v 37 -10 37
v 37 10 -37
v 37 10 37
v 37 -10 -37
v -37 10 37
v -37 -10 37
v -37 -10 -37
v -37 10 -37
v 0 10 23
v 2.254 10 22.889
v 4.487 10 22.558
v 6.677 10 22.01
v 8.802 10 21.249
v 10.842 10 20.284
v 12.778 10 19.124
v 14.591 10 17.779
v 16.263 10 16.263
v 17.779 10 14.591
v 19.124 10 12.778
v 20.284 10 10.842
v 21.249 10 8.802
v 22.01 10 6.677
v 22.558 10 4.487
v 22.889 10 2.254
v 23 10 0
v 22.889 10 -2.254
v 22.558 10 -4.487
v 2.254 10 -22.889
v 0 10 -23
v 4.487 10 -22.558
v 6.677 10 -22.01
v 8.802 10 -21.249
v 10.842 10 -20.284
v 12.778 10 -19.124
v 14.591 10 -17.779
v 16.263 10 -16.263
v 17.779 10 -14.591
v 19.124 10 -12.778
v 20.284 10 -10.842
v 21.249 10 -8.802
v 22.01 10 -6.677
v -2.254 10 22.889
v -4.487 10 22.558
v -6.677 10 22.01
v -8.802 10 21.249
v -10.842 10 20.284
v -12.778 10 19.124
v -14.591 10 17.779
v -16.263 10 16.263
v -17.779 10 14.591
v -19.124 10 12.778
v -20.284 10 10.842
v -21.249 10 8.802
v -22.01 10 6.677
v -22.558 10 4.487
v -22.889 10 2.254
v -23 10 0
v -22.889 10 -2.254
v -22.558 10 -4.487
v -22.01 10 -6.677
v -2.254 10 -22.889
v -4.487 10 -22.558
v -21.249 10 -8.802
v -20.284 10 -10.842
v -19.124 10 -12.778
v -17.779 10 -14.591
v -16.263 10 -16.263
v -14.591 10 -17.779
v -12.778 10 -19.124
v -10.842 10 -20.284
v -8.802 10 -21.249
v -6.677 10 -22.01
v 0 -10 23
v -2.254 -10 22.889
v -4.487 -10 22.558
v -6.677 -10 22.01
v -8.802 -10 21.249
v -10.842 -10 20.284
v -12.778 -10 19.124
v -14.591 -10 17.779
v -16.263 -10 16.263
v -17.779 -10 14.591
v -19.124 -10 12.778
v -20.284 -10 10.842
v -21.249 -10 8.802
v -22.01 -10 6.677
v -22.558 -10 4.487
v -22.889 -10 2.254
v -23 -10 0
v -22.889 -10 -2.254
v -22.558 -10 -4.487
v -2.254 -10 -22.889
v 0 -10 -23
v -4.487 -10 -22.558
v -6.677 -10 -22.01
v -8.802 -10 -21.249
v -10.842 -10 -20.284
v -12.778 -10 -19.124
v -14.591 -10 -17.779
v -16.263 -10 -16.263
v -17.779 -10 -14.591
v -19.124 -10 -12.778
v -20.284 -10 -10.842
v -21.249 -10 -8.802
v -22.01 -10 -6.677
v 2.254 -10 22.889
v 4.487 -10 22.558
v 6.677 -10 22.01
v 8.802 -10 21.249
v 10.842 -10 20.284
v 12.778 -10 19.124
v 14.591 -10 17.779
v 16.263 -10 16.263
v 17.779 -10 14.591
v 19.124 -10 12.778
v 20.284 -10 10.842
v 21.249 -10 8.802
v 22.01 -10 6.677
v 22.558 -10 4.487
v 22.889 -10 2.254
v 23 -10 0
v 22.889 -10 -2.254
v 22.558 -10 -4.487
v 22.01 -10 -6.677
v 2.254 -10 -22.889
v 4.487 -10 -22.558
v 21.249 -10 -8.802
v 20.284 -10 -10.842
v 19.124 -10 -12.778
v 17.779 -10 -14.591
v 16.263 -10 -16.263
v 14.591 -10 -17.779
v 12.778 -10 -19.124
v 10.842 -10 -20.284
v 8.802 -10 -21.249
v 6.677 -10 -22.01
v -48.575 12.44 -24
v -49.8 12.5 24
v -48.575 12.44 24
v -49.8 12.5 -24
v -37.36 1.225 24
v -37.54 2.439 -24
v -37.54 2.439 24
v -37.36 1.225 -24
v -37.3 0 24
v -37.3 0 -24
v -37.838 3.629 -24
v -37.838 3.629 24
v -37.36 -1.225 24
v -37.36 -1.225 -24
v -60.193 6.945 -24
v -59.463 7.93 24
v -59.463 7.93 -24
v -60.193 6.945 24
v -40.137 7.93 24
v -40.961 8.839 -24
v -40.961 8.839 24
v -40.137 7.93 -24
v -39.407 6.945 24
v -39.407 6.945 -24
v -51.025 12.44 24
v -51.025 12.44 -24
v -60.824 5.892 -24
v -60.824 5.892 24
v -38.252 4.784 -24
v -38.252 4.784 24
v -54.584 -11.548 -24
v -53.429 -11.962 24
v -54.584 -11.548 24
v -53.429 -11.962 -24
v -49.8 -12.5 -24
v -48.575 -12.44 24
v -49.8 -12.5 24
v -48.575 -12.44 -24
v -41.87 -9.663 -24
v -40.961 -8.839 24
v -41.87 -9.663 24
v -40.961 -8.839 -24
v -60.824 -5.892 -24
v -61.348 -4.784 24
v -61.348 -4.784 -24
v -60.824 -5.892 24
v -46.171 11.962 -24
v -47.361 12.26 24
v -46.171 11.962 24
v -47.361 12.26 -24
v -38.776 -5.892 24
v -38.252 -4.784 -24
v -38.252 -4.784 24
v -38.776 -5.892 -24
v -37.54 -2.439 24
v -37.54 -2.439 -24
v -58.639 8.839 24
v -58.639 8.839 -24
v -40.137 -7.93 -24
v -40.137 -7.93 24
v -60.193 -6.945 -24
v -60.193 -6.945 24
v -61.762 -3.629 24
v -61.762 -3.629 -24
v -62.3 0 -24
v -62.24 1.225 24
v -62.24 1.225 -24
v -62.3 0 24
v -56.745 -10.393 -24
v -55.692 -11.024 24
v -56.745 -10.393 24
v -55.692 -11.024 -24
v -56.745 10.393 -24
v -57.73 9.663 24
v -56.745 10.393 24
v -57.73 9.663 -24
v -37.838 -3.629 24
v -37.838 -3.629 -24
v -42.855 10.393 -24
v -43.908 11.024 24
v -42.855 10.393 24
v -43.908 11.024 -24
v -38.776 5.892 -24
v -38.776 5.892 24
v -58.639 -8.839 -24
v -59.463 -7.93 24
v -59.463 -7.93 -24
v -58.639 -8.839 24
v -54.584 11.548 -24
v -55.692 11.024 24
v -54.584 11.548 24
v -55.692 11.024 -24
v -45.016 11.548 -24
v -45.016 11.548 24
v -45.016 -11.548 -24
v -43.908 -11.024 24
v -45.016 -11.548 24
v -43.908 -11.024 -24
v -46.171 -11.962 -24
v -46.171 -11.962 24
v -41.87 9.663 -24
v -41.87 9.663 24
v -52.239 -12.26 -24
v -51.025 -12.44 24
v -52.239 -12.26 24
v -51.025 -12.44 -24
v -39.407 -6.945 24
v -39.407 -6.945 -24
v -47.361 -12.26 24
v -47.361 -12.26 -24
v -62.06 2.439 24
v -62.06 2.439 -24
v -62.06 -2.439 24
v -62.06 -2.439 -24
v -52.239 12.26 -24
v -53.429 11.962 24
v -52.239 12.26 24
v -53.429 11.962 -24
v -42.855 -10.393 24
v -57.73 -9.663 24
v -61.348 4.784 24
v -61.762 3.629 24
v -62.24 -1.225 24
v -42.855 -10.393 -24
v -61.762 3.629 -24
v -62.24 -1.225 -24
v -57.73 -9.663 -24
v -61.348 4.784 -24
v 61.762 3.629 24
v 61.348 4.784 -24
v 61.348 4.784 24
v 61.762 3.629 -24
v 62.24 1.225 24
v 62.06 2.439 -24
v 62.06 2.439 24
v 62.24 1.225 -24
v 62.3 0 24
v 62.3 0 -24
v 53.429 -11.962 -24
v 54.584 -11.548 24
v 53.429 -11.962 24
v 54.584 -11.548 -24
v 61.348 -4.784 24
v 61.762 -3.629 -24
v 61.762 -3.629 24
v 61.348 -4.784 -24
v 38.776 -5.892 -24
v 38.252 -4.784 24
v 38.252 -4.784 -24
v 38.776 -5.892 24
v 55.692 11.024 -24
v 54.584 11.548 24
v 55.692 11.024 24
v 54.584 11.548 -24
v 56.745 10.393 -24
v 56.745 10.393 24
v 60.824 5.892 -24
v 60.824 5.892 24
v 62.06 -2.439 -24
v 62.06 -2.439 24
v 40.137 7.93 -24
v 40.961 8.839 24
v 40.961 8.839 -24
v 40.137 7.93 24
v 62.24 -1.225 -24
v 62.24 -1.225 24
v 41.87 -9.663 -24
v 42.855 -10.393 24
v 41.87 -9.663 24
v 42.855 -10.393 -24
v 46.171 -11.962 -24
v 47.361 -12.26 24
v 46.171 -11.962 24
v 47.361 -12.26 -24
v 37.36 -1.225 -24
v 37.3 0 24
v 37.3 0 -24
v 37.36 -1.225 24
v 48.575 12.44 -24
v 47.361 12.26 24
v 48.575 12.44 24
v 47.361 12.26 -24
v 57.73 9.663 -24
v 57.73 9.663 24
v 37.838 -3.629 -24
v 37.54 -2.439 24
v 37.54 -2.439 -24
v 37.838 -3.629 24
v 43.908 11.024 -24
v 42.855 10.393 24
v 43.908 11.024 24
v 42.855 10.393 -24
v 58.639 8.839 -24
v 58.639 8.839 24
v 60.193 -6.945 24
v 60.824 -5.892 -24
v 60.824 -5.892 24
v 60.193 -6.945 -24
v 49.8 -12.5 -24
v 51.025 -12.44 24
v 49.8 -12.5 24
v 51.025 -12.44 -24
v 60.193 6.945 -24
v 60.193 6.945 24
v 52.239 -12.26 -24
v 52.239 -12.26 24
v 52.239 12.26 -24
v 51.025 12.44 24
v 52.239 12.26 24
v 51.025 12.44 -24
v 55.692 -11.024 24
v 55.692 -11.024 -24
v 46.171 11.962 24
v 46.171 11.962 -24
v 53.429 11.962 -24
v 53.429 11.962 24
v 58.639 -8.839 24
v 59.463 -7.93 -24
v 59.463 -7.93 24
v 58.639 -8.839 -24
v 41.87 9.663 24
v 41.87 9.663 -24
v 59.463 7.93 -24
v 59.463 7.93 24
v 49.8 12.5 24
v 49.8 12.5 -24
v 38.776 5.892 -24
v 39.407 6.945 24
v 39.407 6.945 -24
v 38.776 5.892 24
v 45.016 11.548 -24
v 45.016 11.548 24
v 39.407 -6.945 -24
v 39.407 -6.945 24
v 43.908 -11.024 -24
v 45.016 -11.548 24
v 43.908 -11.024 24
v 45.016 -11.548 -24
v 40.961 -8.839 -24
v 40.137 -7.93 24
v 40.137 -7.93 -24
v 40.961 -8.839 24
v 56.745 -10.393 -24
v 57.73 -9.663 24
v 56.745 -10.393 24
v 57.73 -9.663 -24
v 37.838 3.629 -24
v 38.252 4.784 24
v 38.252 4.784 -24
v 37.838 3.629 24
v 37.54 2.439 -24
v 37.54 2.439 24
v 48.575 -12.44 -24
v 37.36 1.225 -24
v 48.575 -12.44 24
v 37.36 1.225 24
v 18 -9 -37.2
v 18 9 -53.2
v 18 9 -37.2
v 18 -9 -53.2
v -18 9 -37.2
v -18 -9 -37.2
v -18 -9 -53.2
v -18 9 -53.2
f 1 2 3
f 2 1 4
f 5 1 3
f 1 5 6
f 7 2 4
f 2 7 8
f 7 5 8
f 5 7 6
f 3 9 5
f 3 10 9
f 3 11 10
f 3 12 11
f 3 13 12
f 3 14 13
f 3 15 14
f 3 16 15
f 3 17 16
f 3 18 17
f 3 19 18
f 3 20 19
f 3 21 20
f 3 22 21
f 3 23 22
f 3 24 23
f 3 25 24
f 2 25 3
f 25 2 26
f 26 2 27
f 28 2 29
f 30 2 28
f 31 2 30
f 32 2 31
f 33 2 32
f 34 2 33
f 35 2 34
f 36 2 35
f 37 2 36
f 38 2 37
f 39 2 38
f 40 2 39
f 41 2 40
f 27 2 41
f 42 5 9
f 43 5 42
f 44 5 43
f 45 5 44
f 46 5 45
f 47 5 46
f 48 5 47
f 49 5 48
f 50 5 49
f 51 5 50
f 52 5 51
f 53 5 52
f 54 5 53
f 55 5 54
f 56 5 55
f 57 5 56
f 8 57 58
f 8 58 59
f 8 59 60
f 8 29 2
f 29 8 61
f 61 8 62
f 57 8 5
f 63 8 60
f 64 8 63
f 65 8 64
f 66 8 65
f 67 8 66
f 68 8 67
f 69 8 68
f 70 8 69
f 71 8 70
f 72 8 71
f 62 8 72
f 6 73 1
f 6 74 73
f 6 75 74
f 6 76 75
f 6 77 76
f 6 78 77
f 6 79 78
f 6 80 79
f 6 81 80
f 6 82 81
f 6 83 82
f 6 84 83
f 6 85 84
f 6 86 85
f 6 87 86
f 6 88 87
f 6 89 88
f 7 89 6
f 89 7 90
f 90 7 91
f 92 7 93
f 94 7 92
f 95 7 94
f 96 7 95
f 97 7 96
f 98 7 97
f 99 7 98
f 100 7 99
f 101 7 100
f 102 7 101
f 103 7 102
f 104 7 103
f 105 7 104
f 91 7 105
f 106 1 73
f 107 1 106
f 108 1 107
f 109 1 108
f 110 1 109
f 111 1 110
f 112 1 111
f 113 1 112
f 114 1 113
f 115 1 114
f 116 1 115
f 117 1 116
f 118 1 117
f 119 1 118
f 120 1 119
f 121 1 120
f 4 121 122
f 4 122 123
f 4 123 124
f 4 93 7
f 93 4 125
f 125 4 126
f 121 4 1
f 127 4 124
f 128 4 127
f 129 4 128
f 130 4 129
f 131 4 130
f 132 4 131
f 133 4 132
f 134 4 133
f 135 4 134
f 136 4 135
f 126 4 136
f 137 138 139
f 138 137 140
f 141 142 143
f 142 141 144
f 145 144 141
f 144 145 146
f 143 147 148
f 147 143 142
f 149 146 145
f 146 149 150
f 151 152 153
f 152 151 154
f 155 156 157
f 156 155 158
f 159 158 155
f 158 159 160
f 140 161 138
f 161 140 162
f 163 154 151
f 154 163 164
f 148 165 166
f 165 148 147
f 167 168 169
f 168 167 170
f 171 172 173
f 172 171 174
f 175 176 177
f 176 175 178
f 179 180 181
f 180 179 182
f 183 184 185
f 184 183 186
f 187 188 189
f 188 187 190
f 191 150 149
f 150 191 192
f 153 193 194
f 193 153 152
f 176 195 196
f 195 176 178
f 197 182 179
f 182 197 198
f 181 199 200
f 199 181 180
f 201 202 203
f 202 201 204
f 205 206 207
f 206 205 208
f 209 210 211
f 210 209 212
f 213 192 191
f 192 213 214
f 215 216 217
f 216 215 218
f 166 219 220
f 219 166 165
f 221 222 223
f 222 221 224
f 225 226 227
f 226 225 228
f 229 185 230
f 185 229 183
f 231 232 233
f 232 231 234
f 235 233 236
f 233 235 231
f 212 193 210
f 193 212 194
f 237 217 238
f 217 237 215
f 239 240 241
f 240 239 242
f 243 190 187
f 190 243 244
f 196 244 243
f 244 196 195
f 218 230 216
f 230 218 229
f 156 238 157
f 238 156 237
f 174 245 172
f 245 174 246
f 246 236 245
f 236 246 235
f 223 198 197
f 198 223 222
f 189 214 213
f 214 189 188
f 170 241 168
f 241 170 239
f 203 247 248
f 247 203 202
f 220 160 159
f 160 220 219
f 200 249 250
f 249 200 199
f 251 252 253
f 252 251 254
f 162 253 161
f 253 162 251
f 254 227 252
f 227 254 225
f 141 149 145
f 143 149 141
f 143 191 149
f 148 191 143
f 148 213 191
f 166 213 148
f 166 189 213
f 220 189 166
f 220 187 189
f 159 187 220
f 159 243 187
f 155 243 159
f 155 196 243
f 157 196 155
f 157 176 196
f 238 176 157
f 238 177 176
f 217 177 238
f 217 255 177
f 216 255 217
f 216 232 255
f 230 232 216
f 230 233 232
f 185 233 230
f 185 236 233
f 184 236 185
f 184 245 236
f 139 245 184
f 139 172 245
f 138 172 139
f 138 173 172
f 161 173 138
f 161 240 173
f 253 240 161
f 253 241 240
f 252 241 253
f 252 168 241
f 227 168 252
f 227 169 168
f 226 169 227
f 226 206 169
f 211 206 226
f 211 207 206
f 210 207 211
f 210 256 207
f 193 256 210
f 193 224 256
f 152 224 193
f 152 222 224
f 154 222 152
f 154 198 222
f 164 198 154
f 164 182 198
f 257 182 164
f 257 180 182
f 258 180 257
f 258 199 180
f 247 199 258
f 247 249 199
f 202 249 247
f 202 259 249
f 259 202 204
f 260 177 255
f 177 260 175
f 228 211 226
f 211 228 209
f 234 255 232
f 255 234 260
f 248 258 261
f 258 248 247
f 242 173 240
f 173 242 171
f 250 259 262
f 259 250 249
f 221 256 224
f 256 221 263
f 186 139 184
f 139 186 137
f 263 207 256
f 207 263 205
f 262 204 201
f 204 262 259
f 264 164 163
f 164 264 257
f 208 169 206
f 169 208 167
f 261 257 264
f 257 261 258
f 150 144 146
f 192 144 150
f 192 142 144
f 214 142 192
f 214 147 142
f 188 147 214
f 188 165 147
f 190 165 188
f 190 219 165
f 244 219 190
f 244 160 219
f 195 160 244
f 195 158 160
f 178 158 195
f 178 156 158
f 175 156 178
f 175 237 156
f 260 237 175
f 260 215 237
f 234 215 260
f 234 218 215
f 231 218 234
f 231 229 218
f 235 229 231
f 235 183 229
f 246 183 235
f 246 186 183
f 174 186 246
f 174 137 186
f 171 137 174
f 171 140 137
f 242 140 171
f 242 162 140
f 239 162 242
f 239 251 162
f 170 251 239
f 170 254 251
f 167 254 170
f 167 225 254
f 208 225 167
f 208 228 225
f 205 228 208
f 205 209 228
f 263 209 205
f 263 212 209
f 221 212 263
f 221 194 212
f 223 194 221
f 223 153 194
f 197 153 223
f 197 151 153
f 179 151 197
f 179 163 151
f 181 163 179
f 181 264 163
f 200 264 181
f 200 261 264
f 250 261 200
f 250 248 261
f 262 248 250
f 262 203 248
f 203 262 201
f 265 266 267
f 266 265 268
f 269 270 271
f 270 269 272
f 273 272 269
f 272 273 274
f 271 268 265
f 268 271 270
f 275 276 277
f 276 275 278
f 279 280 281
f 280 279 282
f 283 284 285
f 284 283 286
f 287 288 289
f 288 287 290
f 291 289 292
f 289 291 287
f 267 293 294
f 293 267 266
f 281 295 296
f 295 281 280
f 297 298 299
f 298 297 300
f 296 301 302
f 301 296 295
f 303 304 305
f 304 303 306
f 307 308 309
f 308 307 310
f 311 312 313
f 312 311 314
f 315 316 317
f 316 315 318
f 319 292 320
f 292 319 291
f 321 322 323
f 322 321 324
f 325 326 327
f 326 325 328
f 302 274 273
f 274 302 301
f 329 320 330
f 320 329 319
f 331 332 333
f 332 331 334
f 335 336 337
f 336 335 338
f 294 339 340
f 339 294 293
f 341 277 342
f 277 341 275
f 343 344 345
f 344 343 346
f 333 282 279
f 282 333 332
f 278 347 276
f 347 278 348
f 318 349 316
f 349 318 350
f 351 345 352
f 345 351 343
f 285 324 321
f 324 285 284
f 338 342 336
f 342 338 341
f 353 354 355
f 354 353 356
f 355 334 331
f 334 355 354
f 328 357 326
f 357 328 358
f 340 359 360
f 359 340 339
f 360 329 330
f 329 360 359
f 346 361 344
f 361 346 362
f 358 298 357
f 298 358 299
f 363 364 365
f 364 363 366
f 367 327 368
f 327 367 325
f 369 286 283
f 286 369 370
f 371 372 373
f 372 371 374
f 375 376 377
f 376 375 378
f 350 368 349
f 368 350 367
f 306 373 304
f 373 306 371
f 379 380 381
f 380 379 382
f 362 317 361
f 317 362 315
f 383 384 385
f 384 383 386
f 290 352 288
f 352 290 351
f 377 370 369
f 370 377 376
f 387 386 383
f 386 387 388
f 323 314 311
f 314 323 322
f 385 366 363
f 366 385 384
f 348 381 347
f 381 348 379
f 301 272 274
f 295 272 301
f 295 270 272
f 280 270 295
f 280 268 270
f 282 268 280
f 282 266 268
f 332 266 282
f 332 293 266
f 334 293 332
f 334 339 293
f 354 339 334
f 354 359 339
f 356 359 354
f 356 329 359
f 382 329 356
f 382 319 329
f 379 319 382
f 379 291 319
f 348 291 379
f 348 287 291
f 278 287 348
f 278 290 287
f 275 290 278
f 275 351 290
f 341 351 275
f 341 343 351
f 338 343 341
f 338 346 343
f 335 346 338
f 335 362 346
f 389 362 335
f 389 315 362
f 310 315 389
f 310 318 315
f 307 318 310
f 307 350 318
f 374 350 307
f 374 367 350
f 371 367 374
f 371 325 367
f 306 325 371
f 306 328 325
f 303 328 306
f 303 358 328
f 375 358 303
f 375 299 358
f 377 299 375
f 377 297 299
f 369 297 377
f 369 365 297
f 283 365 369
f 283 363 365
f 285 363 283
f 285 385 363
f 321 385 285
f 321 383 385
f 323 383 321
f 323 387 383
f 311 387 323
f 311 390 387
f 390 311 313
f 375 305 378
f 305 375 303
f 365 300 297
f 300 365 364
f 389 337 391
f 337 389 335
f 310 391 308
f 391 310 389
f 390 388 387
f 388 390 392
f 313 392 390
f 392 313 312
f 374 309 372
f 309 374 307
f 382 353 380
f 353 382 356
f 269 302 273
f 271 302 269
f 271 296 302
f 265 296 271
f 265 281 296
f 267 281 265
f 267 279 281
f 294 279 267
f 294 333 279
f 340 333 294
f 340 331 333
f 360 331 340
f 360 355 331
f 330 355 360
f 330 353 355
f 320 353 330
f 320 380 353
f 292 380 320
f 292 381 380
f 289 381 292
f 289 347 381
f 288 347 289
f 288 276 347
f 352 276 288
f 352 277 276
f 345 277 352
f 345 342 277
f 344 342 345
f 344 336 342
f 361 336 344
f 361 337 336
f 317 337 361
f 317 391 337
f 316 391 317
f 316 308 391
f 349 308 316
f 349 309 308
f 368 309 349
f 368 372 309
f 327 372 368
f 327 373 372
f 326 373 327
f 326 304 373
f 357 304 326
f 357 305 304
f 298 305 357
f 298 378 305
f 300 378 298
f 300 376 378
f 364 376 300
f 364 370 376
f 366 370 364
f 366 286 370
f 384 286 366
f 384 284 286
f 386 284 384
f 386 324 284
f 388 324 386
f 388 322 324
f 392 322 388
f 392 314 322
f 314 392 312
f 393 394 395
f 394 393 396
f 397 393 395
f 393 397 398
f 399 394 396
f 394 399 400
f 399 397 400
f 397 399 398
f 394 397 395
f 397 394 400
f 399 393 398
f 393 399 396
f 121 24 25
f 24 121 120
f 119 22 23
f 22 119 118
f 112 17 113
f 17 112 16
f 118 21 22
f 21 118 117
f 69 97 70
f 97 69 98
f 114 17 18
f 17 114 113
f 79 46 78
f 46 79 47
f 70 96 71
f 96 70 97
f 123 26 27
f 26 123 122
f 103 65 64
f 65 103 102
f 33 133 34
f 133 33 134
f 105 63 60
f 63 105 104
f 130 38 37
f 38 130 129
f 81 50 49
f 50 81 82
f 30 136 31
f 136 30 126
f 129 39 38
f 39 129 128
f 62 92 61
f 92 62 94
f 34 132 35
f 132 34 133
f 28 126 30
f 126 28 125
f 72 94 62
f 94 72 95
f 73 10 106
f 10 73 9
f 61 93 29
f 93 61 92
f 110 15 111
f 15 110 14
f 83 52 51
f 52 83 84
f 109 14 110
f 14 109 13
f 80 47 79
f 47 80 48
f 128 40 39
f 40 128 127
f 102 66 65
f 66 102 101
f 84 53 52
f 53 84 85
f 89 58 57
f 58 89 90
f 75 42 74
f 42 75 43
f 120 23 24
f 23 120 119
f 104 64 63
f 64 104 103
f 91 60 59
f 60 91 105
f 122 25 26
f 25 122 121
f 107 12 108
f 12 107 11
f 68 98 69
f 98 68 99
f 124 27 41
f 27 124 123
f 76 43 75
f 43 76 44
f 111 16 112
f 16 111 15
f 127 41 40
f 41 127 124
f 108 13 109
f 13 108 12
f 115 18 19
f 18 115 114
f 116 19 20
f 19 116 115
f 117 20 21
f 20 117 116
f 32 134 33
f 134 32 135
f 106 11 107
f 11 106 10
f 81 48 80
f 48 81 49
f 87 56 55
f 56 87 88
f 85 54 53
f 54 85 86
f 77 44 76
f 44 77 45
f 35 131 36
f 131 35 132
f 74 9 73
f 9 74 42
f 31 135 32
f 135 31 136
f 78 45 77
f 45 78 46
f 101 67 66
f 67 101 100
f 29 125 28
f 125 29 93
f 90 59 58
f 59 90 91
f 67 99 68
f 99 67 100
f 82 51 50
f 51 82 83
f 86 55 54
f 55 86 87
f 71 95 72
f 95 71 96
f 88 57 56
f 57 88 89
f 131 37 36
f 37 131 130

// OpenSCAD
// ============================================================================
// Atom Lithography Machine — Parametric OpenSCAD Module (S5.5-04)
// ============================================================================
// part_id           : S5.5-04
// parent_bom_id     : S5.5
// subsystem         : S5
// part_name         : Donanimsal lazer deklansor kilidi (MXC <1 K + UHV vana emniyet arayuzu, Exp130)
// material          : 316LN
// temp_stage        : 300 K
// vacuum_grade      : Atmosfer / UHV arayuz
// tolerance         : <5 ms kesme
// computed_mass_kg  : 0.77911
// envelope_mm       : 124.600 x 25.000 x 90.200
// design_maturity   : M0_M1_DETAILED_CAD_DESIGN_ONLY
// no_lab_measurement: true
// iec61508_certified: false
// semi_s2_certified : false
// Units: millimeters (mm)
// ============================================================================

$fn = 64;

// Nominal bounding envelope parameters (mm)
bbox_x = 124.6000;
bbox_y = 25.0000;
bbox_z = 90.2000;

// Part-specific parametric dimensions
body_xy = 74.0;
body_t = 20.0;
aperture_d = 46.0;
close_time_ms = 3.2;

// Interface / port parameters (mm)
port_viewport_side_ap_bore = 46.000;
port_laser_side_ap_bore = 46.000;

module part_S5_5_04() {
  difference() {
    union() {
      // 316LN fail-safe shutter housing (74x20x74 mm)
      cube([74.000, 20.000, 74.000], center=true);
      // Redundant fail-safe solenoid coil Ch-A
      translate([-49.800, 0.000, 0.000]) cylinder(d=25.000, h=48.000, center=true);
      // Redundant fail-safe solenoid coil Ch-B
      translate([49.800, 0.000, 0.000]) cylinder(d=25.000, h=48.000, center=true);
      // MXC<1 K & SIL-3 PLC interlock connector
      translate([0.000, 0.000, -45.200]) cube([36.000, 18.000, 16.000], center=true);
    }
    // Dia 46 mm clear 808 nm beam aperture
    rotate([90.000, 0.000, 0.000]) cylinder(d=46.000, h=24.000, center=true);
  }
}

// World assembly mounting transform (global machine frame, mm / deg):
// translate([0.000, 327.000, 500.000]) rotate([0.000, 0.000, 0.000]) part_S5_5_04();

part_S5_5_04();
